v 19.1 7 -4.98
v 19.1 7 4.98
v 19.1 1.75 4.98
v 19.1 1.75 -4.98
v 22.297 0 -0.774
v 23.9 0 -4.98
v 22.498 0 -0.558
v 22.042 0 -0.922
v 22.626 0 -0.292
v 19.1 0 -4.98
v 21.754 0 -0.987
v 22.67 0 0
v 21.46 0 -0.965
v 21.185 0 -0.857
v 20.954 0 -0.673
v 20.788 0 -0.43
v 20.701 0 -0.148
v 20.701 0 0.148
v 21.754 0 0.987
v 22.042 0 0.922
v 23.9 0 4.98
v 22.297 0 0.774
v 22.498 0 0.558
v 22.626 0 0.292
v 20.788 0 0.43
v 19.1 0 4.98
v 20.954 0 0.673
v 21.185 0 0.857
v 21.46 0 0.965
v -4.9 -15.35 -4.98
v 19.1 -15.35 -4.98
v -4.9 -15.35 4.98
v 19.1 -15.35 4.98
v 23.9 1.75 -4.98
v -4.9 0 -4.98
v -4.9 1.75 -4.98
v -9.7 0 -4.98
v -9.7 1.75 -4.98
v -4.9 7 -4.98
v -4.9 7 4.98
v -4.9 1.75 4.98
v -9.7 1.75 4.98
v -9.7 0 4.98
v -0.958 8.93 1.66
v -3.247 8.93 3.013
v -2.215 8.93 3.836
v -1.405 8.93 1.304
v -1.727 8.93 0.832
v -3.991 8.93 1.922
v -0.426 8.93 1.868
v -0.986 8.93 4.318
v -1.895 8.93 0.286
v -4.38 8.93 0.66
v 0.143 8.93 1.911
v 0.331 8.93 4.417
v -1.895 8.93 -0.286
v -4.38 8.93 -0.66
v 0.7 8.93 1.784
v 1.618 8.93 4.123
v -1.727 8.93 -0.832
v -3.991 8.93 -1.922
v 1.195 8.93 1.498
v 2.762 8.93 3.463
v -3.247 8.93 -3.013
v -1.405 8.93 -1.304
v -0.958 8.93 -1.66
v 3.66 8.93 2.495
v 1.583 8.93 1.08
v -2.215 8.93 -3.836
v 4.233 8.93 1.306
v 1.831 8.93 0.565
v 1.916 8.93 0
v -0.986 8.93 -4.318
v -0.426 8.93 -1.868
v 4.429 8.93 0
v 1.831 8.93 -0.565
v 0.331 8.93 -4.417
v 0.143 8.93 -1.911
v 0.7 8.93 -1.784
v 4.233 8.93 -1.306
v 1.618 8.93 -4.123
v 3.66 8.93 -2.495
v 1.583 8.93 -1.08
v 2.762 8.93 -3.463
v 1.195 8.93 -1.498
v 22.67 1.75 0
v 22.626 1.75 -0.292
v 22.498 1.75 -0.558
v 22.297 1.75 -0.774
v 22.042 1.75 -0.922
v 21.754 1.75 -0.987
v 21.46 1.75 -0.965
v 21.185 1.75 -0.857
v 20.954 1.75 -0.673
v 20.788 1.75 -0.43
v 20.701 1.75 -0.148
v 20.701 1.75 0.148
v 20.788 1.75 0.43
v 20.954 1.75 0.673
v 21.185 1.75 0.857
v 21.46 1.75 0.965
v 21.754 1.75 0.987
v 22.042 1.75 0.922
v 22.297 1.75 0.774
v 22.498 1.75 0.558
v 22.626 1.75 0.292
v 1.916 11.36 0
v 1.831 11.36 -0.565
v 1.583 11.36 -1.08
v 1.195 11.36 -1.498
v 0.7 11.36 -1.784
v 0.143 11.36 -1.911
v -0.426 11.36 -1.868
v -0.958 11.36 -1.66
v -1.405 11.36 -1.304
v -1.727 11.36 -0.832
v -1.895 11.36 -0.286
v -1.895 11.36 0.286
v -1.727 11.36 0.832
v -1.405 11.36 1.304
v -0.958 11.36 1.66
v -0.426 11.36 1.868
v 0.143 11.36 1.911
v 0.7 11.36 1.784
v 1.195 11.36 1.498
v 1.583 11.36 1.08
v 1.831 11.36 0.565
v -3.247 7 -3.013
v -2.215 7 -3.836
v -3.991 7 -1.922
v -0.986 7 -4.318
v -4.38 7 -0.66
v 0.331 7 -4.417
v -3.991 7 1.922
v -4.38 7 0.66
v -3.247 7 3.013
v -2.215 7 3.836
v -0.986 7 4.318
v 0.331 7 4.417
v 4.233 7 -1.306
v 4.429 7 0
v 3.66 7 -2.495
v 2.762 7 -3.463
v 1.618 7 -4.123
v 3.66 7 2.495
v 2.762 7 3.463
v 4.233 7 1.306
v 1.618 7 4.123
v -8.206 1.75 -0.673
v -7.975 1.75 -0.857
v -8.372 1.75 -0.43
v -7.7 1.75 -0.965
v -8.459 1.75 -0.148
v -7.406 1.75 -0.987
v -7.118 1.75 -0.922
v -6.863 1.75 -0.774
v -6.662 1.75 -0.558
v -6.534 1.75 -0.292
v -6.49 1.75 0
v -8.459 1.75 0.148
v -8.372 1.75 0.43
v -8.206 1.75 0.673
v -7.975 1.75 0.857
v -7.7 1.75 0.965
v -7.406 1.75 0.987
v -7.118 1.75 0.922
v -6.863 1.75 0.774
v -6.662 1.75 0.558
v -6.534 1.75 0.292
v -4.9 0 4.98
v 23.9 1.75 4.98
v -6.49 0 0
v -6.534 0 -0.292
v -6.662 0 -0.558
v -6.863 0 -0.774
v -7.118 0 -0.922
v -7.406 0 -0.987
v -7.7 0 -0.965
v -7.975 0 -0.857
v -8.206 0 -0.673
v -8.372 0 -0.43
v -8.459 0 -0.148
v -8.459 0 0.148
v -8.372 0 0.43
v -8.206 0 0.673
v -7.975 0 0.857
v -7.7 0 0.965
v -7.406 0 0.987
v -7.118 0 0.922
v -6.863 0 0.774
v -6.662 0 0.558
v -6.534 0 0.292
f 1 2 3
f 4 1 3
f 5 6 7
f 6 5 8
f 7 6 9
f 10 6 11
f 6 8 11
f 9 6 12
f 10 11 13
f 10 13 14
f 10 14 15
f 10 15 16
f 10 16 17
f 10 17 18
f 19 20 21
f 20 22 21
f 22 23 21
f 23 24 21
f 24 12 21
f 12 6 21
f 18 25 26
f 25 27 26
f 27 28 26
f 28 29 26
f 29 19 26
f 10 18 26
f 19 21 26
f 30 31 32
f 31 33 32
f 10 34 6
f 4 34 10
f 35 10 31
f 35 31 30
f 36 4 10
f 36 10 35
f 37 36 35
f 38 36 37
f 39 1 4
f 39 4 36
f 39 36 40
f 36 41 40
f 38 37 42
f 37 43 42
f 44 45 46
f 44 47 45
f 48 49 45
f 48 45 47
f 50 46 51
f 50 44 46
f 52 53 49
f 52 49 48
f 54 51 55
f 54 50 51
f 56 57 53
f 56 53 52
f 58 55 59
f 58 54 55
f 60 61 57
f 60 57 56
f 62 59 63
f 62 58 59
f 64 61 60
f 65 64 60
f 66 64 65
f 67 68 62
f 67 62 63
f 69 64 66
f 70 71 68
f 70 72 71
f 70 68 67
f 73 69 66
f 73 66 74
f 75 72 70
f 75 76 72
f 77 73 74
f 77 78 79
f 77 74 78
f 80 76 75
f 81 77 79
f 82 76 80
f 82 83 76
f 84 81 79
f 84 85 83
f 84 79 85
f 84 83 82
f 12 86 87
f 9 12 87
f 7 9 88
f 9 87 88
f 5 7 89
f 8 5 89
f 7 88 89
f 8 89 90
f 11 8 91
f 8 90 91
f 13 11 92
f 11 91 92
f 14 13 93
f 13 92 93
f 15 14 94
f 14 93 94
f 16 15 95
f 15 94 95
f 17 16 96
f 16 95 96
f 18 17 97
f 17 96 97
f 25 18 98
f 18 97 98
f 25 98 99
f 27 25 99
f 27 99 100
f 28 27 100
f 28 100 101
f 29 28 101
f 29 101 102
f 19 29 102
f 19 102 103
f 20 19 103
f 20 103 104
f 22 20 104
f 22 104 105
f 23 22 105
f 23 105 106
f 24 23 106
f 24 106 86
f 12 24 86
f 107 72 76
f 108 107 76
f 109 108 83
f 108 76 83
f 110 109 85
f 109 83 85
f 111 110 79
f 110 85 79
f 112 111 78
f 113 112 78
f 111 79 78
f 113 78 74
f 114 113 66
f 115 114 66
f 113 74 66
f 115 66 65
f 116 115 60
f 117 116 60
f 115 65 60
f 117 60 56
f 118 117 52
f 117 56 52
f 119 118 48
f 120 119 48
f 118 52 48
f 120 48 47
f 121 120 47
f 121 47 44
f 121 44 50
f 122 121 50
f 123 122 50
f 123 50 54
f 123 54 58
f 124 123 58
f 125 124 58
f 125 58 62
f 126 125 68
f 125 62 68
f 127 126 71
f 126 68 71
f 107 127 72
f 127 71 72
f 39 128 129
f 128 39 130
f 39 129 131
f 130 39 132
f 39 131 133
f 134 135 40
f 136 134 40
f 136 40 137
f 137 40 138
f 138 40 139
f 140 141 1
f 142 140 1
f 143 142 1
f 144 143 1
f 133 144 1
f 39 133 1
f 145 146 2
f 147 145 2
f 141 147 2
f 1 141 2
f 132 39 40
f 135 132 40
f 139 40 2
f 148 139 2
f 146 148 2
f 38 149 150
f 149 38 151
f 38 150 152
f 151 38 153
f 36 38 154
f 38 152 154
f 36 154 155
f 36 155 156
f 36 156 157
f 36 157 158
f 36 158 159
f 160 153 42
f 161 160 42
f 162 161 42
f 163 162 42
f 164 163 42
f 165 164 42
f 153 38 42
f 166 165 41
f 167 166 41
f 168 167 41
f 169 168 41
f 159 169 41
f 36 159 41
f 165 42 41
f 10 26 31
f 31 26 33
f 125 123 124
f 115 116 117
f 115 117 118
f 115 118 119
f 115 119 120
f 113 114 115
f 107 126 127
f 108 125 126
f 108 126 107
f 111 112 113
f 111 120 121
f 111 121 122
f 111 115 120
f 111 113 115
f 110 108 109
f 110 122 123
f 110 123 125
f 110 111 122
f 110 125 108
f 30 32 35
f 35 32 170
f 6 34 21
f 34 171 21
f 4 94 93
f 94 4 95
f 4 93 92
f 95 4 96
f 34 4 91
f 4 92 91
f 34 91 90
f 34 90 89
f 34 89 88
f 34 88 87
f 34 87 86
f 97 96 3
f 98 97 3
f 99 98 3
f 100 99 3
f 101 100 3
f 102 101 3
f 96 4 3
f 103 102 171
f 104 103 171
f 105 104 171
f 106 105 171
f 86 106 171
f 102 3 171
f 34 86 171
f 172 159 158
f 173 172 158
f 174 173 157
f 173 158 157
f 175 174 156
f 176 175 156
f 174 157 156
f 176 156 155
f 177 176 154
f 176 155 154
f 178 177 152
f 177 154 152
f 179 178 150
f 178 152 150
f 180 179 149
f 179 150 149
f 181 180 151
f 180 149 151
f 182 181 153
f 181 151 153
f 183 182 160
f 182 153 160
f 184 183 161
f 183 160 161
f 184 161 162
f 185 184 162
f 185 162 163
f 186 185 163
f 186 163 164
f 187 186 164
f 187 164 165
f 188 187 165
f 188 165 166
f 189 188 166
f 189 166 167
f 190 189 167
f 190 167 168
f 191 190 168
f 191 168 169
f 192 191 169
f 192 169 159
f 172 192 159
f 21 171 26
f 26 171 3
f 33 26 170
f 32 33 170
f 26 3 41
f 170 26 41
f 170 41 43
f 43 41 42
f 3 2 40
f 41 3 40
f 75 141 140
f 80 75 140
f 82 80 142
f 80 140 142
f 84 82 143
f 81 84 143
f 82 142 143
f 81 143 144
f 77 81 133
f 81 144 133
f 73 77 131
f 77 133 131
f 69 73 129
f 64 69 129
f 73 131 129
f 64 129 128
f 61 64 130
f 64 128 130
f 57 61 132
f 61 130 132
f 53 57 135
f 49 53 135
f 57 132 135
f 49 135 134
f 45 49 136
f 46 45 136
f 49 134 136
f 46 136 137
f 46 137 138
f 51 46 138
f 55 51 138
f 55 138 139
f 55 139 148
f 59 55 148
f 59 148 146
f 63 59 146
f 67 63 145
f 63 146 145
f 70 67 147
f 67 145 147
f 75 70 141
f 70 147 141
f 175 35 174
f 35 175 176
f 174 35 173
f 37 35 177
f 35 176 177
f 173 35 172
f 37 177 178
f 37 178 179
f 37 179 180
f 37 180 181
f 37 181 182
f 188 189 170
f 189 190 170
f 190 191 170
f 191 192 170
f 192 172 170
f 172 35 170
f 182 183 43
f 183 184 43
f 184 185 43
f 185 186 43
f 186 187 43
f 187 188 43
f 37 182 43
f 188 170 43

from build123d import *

# Parameters (mm, degrees)
BOSS_EXTRUDE1_DEPTH = 4.98
SKETCH2_R           = 0.99
CUT_EXTRUDE1_DEPTH  = 18.1
SKETCH3_R           = 4.42938454
BOSS_EXTRUDE2_DEPTH = 1.93
SKETCH4_R           = 1.916429151
BOSS_EXTRUDE3_DEPTH = 2.43


with BuildPart() as part:
    # Sketch1 → Boss-Extrude1 (new body, symmetric)
    with BuildSketch(Plane.XY):
        Polygon((19.1, 1.75), (23.9, 1.75), (23.9, 0), (19.1, 0), (19.1, -15.35), (-4.9, -15.35), (-4.9, 0), (-9.7, 0), (-9.7, 1.75), (-4.9, 1.75), (-4.9, 7), (19.1, 7), align=None)
    extrude(amount=BOSS_EXTRUDE1_DEPTH, both=True)

    # Sketch2 → Cut-Extrude1 (cut, through all)
    with BuildSketch(Plane(origin=(0, 1.75, 0), x_dir=(1, 0, 0), z_dir=(0, 1, 0))):
        with Locations((-7.48, 0)):
            Circle(SKETCH2_R)
        with Locations((21.68, 0)):
            Circle(SKETCH2_R)
    extrude(amount=-CUT_EXTRUDE1_DEPTH, mode=Mode.SUBTRACT)

    # Sketch3 → Boss-Extrude2 (add)
    with BuildSketch(Plane(origin=(0, 7, 0), x_dir=(1, 0, 0), z_dir=(0, 1, 0))):
        Circle(SKETCH3_R)
    extrude(amount=BOSS_EXTRUDE2_DEPTH)

    # Sketch4 → Boss-Extrude3 (add)
    with BuildSketch(Plane(origin=(0, 8.93, 0), x_dir=(1, 0, 0), z_dir=(0, 1, 0))):
        Circle(SKETCH4_R)
    extrude(amount=BOSS_EXTRUDE3_DEPTH)


solid = part.part
